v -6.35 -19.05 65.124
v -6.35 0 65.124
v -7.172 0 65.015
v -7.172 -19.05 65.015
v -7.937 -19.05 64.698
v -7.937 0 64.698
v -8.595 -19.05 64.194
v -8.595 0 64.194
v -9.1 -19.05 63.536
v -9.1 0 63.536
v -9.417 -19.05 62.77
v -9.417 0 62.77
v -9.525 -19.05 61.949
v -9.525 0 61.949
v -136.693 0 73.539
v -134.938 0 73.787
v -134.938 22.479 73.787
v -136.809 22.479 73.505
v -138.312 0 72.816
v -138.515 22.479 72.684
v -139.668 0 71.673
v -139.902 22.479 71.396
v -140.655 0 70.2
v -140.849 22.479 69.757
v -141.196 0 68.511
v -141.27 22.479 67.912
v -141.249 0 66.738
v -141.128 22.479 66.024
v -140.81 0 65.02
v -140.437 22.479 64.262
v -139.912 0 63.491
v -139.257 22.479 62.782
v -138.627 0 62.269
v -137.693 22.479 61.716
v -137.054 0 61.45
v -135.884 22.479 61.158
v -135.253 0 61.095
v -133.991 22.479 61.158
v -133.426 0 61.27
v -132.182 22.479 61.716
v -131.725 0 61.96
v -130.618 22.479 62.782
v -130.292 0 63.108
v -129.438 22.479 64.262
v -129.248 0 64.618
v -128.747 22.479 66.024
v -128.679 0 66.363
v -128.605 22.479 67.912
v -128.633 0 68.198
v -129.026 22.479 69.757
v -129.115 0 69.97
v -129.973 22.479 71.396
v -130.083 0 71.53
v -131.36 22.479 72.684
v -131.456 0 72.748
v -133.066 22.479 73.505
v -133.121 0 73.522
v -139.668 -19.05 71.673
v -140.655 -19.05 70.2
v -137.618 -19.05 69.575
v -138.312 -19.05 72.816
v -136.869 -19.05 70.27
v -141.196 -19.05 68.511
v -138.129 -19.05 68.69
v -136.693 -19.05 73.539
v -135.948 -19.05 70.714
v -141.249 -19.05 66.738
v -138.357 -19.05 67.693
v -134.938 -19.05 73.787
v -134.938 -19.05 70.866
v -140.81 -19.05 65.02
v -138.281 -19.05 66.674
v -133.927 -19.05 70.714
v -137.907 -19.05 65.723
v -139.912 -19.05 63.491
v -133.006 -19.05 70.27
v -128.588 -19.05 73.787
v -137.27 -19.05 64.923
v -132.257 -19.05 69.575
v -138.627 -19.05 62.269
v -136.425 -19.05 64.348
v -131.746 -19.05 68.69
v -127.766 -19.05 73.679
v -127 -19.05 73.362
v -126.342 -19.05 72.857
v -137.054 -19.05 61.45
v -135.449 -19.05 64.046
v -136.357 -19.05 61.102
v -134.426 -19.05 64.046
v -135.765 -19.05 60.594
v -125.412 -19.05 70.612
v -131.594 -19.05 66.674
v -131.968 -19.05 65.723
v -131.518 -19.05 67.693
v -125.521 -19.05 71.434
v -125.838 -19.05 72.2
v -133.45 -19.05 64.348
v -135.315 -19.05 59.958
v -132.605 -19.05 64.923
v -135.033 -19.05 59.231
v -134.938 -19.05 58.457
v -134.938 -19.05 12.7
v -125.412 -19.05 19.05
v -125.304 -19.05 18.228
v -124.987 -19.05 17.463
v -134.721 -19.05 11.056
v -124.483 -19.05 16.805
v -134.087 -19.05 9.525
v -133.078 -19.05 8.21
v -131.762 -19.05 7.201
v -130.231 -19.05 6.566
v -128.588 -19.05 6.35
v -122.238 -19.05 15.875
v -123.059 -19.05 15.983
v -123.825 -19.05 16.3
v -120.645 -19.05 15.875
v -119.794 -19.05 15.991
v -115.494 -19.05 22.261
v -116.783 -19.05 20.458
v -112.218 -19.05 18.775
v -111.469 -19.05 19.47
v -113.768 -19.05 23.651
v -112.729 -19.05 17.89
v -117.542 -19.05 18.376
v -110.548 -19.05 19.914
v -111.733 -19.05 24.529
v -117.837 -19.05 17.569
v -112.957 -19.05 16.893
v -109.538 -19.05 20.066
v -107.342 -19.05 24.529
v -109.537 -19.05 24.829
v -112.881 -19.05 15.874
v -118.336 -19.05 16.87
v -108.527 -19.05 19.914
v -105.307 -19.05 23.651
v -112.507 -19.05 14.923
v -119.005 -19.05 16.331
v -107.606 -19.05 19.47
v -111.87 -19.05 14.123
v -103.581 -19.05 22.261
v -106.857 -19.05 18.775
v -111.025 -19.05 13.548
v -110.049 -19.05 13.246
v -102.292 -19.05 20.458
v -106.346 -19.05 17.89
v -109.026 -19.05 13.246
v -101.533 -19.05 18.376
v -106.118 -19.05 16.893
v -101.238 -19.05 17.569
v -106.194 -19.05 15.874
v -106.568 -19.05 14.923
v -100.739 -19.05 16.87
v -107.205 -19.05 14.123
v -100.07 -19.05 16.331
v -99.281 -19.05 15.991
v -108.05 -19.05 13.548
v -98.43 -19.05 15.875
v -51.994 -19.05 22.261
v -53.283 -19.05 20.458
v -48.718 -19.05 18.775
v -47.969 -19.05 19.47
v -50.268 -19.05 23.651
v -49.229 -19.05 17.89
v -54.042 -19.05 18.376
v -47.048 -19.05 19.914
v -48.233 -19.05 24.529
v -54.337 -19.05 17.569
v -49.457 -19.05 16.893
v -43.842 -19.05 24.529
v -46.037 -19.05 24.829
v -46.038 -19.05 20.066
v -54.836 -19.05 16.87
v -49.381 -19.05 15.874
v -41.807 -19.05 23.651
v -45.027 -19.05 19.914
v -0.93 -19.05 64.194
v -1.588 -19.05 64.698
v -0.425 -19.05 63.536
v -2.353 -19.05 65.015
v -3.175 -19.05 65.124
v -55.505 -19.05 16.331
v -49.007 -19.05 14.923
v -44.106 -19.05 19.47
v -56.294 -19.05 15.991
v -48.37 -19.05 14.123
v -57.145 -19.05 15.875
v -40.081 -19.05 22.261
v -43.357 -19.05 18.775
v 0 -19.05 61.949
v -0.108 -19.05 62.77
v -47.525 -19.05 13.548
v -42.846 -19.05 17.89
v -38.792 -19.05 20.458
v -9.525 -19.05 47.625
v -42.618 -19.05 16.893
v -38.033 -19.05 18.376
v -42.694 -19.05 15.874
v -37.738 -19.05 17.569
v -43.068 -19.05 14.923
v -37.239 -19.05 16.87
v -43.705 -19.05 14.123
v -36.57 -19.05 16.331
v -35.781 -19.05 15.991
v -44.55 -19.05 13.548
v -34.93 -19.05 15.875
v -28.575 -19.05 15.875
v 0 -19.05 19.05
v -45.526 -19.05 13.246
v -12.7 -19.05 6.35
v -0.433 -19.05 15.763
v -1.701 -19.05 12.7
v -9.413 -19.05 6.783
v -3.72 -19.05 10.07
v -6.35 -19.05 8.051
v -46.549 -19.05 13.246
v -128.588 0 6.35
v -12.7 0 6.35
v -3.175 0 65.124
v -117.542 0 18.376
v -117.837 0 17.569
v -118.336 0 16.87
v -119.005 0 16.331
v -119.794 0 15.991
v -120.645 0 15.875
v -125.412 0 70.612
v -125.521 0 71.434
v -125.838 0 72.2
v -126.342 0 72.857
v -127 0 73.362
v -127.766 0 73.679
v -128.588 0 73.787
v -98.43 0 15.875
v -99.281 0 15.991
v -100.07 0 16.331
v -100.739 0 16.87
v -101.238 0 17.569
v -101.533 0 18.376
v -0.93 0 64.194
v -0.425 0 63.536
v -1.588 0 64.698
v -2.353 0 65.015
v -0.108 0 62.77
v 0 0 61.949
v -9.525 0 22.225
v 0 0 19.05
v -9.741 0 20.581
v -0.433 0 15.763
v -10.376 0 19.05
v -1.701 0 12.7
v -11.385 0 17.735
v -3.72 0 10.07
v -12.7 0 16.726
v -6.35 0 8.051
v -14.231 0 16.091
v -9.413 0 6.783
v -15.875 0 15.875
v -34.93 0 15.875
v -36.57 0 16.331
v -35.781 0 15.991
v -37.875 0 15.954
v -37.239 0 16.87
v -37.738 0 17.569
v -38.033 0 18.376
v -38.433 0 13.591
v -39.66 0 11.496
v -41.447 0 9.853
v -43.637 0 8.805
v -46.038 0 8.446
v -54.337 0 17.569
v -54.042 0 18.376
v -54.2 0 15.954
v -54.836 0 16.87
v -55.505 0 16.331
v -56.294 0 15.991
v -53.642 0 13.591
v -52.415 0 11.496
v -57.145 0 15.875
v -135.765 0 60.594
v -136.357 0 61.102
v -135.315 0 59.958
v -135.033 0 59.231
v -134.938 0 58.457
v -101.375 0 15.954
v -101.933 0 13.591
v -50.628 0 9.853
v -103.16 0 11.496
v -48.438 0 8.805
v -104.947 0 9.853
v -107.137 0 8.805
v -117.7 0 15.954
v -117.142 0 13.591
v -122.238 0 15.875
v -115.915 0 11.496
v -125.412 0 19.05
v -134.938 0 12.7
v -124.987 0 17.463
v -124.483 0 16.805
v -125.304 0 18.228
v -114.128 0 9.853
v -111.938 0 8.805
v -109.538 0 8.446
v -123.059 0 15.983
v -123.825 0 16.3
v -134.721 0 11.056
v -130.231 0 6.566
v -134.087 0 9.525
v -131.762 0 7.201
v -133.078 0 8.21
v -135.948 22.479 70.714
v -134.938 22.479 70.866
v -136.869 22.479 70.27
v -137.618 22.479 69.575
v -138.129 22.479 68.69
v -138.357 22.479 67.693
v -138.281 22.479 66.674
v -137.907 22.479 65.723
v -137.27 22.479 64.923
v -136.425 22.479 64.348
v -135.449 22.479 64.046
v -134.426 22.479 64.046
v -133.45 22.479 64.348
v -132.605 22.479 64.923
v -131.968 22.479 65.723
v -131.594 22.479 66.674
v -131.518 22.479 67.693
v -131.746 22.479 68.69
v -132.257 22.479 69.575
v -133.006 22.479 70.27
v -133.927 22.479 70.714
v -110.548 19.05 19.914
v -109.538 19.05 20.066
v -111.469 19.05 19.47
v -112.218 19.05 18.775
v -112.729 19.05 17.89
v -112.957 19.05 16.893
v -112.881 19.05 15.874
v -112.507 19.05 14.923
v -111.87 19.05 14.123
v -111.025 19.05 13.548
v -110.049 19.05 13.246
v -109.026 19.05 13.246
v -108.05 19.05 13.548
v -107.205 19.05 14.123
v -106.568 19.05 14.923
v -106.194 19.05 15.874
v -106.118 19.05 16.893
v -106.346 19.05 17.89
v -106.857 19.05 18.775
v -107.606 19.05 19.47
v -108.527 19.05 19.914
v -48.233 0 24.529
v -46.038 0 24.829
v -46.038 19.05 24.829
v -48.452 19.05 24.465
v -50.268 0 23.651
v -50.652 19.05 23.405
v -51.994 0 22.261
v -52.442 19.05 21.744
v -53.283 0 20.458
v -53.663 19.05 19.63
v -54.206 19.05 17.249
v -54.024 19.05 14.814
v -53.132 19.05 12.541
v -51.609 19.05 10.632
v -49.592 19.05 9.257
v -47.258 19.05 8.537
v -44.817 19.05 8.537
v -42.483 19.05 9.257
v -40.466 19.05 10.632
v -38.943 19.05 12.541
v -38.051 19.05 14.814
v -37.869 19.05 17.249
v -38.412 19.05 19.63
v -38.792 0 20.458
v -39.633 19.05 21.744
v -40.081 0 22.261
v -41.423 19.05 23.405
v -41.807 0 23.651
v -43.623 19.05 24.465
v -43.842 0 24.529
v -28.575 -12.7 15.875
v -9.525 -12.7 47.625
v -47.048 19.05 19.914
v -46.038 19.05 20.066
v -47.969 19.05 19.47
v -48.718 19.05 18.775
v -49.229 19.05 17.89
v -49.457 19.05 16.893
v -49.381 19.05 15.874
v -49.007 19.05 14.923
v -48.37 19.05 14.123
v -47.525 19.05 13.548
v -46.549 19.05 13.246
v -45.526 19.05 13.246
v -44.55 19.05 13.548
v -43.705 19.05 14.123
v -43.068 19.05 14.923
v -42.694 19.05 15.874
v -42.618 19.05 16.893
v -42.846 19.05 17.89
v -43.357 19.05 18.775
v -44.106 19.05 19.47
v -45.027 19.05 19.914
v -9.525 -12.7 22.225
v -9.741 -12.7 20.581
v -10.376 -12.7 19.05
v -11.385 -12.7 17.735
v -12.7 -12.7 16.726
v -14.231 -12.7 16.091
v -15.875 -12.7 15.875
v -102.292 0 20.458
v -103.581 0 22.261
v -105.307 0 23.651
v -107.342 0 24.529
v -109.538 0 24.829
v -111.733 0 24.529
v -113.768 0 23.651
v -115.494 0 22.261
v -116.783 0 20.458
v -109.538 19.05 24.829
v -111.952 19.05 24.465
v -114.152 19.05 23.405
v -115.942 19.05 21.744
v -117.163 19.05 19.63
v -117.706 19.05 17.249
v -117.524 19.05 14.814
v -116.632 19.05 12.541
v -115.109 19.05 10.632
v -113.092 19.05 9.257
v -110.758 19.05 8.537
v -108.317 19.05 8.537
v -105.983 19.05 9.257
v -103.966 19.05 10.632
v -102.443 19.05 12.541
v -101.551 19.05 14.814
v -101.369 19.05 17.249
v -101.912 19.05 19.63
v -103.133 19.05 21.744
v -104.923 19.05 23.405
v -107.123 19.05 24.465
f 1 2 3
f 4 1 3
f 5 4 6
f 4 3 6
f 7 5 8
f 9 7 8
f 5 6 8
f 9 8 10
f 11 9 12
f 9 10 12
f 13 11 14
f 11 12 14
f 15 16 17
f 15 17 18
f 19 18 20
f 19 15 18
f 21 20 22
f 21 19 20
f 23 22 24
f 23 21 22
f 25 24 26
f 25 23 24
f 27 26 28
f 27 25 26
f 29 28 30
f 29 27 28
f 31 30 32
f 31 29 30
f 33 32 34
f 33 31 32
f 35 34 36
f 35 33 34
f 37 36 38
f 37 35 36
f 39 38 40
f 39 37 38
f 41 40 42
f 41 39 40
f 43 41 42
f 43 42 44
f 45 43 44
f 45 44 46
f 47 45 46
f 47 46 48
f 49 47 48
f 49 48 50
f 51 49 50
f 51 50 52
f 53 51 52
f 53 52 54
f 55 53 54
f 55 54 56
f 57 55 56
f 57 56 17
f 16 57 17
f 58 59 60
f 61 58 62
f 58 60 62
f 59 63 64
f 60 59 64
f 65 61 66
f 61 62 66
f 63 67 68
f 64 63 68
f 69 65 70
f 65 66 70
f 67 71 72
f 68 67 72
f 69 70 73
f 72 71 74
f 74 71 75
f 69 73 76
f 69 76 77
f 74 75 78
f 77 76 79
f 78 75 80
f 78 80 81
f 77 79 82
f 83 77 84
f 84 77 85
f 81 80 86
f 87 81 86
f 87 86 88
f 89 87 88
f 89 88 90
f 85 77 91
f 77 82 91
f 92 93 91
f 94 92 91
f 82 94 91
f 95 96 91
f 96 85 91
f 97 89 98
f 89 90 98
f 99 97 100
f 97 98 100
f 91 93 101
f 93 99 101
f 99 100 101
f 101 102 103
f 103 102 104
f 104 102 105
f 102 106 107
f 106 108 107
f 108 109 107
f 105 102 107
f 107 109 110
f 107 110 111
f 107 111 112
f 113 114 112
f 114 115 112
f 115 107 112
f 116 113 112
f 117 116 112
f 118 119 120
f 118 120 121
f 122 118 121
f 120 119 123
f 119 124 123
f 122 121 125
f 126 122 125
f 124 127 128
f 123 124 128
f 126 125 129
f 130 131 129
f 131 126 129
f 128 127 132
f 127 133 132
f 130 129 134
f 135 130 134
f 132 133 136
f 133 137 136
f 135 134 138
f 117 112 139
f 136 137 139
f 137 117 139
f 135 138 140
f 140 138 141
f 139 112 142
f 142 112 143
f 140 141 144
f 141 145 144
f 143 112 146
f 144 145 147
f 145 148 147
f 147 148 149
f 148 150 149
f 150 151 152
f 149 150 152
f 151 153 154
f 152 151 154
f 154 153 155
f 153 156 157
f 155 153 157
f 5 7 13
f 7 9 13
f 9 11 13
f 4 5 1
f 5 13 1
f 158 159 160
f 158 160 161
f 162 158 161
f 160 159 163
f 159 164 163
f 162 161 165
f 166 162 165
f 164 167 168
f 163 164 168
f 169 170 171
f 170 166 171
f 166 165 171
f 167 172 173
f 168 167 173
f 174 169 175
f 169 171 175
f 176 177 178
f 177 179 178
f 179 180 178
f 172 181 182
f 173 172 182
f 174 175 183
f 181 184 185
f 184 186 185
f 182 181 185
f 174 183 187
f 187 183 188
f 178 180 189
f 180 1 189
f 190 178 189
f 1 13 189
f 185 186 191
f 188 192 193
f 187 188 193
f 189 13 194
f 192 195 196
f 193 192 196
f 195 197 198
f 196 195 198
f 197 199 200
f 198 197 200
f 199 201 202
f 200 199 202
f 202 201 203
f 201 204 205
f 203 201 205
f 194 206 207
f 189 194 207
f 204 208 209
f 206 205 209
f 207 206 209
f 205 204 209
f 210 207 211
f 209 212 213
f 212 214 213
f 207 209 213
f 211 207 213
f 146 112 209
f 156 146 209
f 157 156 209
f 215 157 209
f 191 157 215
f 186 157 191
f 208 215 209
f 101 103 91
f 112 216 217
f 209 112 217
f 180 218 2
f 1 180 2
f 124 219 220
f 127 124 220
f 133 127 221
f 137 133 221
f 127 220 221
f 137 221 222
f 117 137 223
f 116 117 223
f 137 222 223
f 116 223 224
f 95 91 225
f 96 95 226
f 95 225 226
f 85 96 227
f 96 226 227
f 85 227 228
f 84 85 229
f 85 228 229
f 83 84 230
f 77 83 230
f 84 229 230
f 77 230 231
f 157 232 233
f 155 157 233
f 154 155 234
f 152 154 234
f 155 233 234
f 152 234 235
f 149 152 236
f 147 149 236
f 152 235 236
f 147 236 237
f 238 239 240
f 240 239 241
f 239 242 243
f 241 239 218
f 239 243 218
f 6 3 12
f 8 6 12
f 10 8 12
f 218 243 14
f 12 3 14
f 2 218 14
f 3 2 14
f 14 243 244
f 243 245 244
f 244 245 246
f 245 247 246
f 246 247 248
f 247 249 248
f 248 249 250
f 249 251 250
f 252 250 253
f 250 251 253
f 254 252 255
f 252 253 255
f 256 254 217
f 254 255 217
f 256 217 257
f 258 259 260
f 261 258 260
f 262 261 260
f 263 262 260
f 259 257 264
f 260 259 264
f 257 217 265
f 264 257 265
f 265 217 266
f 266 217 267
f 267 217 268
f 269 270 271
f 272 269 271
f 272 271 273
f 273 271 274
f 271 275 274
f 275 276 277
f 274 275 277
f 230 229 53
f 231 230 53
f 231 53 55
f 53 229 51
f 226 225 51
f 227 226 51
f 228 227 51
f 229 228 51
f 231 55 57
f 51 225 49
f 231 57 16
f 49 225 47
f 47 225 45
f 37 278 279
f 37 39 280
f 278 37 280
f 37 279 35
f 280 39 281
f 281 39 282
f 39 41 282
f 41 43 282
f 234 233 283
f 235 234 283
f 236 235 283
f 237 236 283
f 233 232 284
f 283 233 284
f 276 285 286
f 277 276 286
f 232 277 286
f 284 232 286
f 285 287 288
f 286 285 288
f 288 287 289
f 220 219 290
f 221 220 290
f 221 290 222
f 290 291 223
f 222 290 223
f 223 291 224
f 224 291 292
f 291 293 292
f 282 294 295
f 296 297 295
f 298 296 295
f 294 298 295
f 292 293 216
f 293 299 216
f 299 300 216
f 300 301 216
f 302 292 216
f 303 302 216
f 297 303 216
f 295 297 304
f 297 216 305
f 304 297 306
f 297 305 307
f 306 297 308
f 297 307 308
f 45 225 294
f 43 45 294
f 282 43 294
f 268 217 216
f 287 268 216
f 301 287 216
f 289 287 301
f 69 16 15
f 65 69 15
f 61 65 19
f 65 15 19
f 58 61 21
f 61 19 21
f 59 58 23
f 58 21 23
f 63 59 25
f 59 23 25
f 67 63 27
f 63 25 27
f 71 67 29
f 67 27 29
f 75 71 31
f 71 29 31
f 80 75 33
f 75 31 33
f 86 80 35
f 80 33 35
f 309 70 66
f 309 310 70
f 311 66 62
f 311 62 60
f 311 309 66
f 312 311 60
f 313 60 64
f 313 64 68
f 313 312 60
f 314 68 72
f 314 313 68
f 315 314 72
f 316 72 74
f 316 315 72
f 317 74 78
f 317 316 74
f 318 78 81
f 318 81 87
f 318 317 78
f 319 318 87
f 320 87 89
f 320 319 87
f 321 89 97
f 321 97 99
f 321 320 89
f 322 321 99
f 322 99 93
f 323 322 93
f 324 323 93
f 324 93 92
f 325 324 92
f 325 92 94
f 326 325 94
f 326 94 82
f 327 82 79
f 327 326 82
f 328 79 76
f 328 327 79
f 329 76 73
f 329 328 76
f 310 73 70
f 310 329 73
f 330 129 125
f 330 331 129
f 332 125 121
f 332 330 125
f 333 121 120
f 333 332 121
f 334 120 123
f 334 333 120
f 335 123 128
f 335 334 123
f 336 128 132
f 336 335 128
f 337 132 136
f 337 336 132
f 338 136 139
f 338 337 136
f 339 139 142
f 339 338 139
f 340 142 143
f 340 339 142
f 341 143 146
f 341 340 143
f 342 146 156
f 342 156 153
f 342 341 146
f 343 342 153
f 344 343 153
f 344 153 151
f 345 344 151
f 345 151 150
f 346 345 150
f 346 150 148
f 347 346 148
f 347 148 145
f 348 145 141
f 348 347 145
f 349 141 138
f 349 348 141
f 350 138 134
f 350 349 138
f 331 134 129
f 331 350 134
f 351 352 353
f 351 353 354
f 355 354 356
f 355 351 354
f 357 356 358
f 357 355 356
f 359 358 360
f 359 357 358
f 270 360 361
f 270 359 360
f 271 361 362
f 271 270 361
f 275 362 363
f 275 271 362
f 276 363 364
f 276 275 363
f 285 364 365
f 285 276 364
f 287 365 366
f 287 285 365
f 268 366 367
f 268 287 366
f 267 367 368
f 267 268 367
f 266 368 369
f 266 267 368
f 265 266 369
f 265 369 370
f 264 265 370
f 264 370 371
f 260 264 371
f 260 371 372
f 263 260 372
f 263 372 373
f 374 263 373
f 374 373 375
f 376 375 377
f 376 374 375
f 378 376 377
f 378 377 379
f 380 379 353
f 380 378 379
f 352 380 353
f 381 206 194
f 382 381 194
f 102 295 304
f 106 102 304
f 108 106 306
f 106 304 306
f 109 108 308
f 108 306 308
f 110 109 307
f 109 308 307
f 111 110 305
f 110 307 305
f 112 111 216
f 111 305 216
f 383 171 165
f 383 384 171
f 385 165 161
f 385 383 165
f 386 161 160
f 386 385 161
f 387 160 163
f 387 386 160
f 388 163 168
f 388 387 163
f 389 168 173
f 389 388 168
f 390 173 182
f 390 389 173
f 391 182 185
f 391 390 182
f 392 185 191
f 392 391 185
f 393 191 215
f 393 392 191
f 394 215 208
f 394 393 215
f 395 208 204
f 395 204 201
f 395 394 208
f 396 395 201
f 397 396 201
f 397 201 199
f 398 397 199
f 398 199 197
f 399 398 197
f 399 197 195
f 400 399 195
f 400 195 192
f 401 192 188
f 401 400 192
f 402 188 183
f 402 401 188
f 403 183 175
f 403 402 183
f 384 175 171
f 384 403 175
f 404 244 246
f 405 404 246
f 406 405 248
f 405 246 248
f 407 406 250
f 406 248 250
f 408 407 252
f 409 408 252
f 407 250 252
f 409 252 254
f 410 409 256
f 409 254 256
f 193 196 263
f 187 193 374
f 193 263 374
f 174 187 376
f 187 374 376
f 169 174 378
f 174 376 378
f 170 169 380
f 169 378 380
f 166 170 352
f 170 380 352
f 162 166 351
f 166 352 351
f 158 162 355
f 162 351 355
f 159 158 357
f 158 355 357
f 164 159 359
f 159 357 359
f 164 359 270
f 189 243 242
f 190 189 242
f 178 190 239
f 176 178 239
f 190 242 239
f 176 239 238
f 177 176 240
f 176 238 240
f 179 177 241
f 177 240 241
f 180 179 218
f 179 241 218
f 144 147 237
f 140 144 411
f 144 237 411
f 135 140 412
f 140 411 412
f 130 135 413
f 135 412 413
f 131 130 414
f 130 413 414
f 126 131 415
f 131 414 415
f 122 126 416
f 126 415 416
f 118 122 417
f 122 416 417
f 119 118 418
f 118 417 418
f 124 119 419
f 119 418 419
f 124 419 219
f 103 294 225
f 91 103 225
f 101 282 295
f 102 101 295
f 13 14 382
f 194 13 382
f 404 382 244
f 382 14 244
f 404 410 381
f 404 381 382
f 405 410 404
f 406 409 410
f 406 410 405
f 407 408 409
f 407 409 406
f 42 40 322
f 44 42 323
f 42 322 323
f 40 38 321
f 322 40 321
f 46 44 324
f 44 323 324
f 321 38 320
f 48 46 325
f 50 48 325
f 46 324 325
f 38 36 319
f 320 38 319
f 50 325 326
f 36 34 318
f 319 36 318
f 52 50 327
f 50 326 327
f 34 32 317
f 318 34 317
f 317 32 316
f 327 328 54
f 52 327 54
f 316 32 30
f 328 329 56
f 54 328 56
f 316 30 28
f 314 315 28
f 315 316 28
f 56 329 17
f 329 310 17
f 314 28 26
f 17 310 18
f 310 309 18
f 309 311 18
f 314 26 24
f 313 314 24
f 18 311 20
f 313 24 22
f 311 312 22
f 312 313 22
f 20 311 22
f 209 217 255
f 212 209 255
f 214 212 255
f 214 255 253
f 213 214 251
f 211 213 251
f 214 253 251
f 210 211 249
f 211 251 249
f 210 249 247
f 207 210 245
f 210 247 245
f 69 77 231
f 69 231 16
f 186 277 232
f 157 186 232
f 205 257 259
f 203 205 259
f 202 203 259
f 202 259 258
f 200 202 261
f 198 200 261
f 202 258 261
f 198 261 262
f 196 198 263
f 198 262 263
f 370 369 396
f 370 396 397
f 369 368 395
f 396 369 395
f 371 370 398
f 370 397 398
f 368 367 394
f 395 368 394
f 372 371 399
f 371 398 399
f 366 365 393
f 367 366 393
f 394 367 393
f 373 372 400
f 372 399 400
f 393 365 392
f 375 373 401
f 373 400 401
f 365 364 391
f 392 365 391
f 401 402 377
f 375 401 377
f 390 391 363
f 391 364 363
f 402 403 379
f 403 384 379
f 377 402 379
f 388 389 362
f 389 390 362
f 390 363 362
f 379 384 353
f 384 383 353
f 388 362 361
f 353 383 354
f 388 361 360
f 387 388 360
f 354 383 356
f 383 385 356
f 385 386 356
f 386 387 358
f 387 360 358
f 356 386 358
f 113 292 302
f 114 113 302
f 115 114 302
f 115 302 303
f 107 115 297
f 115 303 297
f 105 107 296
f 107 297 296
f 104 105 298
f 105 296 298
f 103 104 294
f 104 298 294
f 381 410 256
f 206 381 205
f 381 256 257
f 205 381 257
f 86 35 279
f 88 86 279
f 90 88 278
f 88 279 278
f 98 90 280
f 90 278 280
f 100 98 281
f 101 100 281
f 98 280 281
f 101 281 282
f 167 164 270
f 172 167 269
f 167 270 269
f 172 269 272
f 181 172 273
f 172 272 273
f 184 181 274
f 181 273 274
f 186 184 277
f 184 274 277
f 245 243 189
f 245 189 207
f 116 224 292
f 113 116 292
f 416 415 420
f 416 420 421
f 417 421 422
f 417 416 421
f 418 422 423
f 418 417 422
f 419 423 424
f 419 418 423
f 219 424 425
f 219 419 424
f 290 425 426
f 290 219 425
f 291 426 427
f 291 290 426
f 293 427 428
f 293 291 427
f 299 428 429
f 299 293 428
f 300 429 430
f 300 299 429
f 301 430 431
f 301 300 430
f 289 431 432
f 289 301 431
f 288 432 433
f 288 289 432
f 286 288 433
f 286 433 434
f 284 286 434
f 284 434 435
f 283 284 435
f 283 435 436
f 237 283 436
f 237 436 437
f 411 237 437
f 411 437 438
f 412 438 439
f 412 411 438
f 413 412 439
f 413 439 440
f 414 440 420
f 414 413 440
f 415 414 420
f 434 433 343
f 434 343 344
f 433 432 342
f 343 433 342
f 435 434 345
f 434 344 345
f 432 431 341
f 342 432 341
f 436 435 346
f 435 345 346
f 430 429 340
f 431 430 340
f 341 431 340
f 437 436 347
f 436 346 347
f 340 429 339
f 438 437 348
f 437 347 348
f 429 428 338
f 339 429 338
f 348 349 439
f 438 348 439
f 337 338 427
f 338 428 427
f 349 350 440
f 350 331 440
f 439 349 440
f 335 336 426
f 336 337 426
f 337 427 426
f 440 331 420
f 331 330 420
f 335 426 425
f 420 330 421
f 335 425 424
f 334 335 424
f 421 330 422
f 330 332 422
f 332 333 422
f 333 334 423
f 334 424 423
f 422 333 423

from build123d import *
from build123d.topology import SkipClean

# Parameters (mm, degrees)
SKETCH2_R                      = 3.429
BOSS_EXTRUDE1_DEPTH            = 19.05
SKETCH3_R                      = 8.1915
SKETCH3_R_2                    = 3.429
SKETCH3_R_3                    = 6.35
BOSS_EXTRUDE2_DEPTH            = 19.05
SKETCH4_R                      = 6.35
SKETCH4_R_2                    = 3.429
BOSS_EXTRUDE5_DEPTH            = 3.429
BOSS_EXTRUDE6_START            = -19.05
BOSS_EXTRUDE6_DEPTH            = 6.35
CUT_EXTRUDE2_REACH             = 162.972
SKETCH7_W                      = 141.2875
SKETCH7_H                      = 67.437060646
CUT_EXTRUDE2_DIRECTION_2_REACH = 162.972


with BuildPart() as part:
    # Sketch2 → Boss-Extrude1 (new body)
    with BuildSketch(Plane(origin=(0, 0, 0), x_dir=(1, 0, 0), z_dir=(0, 1, 0))):
        with BuildLine():
            Line((57.144932013, -15.875), (98.430067987, -15.875))
            ThreePointArc((98.430067987, -15.875), (100.422636409, -16.578098691), (101.532702627, -18.375994594))
            ThreePointArc((101.532702627, -18.375994594), (109.5375, -24.828560646), (117.542297372, -18.375994594))
            ThreePointArc((117.542297372, -18.375994594), (118.652363591, -16.578098691), (120.644932013, -15.875))
            Line((120.644932013, -15.875), (122.2375, -15.875))
            ThreePointArc((122.2375, -15.875), (124.48256403, -16.80493597), (125.4125, -19.05))
            Line((125.4125, -19.05), (125.4125, -70.612060646))
            ThreePointArc((125.4125, -70.612060646), (126.34243597, -72.857124676), (128.5875, -73.787060646))
            Line((128.5875, -73.787060646), (134.9375, -73.787060646))
            ThreePointArc((134.9375, -73.787060646), (141.196050854, -68.510858211), (137.054166667, -61.450223232))
            ThreePointArc((137.054166667, -61.450223232), (135.520123355, -60.28989163), (134.9375, -58.456804525))
            Line((134.9375, -58.456804525), (134.9375, -12.7))
            ThreePointArc((134.9375, -12.7), (133.07762806, -8.209871939), (128.5875, -6.35))
            Line((128.5875, -6.35), (12.7, -6.35))
            ThreePointArc((12.7, -6.35), (3.719743879, -10.069743879), (0, -19.05))
            Line((0, -19.05), (0, -61.948583794))
            ThreePointArc((0, -61.948583794), (0.92993597, -64.193647824), (3.175, -65.123583794))
            Line((3.175, -65.123583794), (6.35, -65.123583794))
            ThreePointArc((6.35, -65.123583794), (8.59506403, -64.193647824), (9.525, -61.948583794))
            Line((9.525, -61.948583794), (9.525, -22.225))
            ThreePointArc((9.525, -22.225), (11.384871939, -17.734871939), (15.875, -15.875))
            Line((15.875, -15.875), (34.930067987, -15.875))
            ThreePointArc((34.930067987, -15.875), (36.922636409, -16.578098691), (38.032702627, -18.375994594))
            ThreePointArc((38.032702627, -18.375994594), (46.0375, -24.828560646), (54.042297372, -18.375994594))
            ThreePointArc((54.042297372, -18.375994594), (55.152363591, -16.578098691), (57.144932013, -15.875))
        make_face()
        with Locations(Location((46.0375, -16.637060646, 0), (0, 0, 270))):
            Circle(SKETCH2_R, mode=Mode.SUBTRACT)
        with Locations(Location((109.5375, -16.637060646, 0), (0, 0, 270))):
            Circle(SKETCH2_R, mode=Mode.SUBTRACT)
        with Locations(Location((134.9375, -67.437060646, 0), (0, 0, 270))):
            Circle(SKETCH2_R, mode=Mode.SUBTRACT)
    boss_extrude1 = extrude(amount=-BOSS_EXTRUDE1_DEPTH)

    # Sketch3 → Boss-Extrude2 (add)
    with BuildSketch(Plane(origin=(0, 0, 0), x_dir=(1, 0, 0), z_dir=(0, 1, 0))):
        with Locations(Location((46.0375, -16.637060646, 0), (0, 0, 270))):
            Circle(SKETCH3_R)
        with Locations(Location((46.0375, -16.637060646, 0), (0, 0, 270))):
            Circle(SKETCH3_R_2, mode=Mode.SUBTRACT)
        with Locations(Location((109.5375, -16.637060646, 0), (0, 0, 270))):
            Circle(SKETCH3_R)
        with Locations(Location((109.5375, -16.637060646, 0), (0, 0, 270))):
            Circle(SKETCH3_R_2, mode=Mode.SUBTRACT)
        with Locations(Location((134.9375, -67.437060646, 0), (0, 0, 270))):
            Circle(SKETCH3_R_3)
        with Locations(Location((134.9375, -67.437060646, 0), (0, 0, 270))):
            Circle(SKETCH3_R_2, mode=Mode.SUBTRACT)
    boss_extrude2 = extrude(amount=BOSS_EXTRUDE2_DEPTH)

    # Sketch4 → Boss-Extrude5 (add)
    with BuildSketch(Plane(origin=(0, 19.05, 0), x_dir=(1, 0, 0), z_dir=(0, 1, 0))):
        with Locations(Location((134.9375, -67.437060646, 0), (0, 0, 270))):
            Circle(SKETCH4_R)
        with Locations(Location((134.9375, -67.437060646, 0), (0, 0, 270))):
            Circle(SKETCH4_R_2, mode=Mode.SUBTRACT)
    boss_extrude5 = extrude(amount=BOSS_EXTRUDE5_DEPTH)

    # Sketch6 → Boss-Extrude6 (add)
    with BuildSketch(Plane(origin=(0, 0, 0), x_dir=(1, 0, 0), z_dir=(0, 1, 0)).offset(BOSS_EXTRUDE6_START)):
        Polygon((28.575, -15.875), (9.525, -47.625), (9.525, -15.875), align=None)
    boss_extrude6 = extrude(amount=BOSS_EXTRUDE6_DEPTH)

    # Mirror4: Boss-Extrude1, Boss-Extrude2, Boss-Extrude5, Boss-Extrude6 across plane
    with SkipClean():  # the faces are left unmerged after this step: merging them gives an invalid solid
        add(boss_extrude1.mirror(Plane(origin=(0, -19.05, 19.05), x_dir=(0, 0, 1), z_dir=(-1, 0, 0))))
        add(boss_extrude2.mirror(Plane(origin=(0, -19.05, 19.05), x_dir=(0, 0, 1), z_dir=(-1, 0, 0))))
        add(boss_extrude5.mirror(Plane(origin=(0, -19.05, 19.05), x_dir=(0, 0, 1), z_dir=(-1, 0, 0))))
        add(boss_extrude6.mirror(Plane(origin=(0, -19.05, 19.05), x_dir=(0, 0, 1), z_dir=(-1, 0, 0))))

    # Cut-Extrude2: up to this face of the body (flat: up to its plane)
    cut_extrude2_end = Plane(part.part.faces().sort_by_distance((134.9375, 22.479, 61.266665768))[0])
    # Sketch7 → Cut-Extrude2 (cut, up to the picked face)
    with BuildSketch(Plane(origin=(0, 0, 0), x_dir=(1, 0, 0), z_dir=(0, 1, 0)), mode=Mode.PRIVATE) as cut_extrude2_sk1:
        with Locations((70.64375, -40.068530323)):
            Rectangle(SKETCH7_W, SKETCH7_H)
    cut_extrude2_tool1 = split(extrude(cut_extrude2_sk1.sketch, amount=CUT_EXTRUDE2_REACH, mode=Mode.PRIVATE), bisect_by=cut_extrude2_end, keep=Keep.BOTH, mode=Mode.PRIVATE)
    add(cut_extrude2_tool1.solids().sort_by(Axis((70.64375, 0, 40.06853), (0, 1, 0)))[0], mode=Mode.SUBTRACT)

    # Cut-Extrude2 direction 2: up to this face of the body (flat: up to its plane)
    cut_extrude2_direction_2_end = Plane(part.part.faces().sort_by_distance((0.921292425, -19.05, 25.561080077))[0])
    # Sketch7 → Cut-Extrude2 direction 2 (cut, up to the picked face)
    with BuildSketch(Plane(origin=(0, 0, 0), x_dir=(1, 0, 0), z_dir=(0, 1, 0)), mode=Mode.PRIVATE) as cut_extrude2_direction_2_sk1:
        with Locations((70.64375, -40.068530323)):
            Rectangle(SKETCH7_W, SKETCH7_H)
    cut_extrude2_direction_2_tool1 = split(extrude(cut_extrude2_direction_2_sk1.sketch, amount=-CUT_EXTRUDE2_DIRECTION_2_REACH, mode=Mode.PRIVATE), bisect_by=cut_extrude2_direction_2_end, keep=Keep.BOTH, mode=Mode.PRIVATE)
    add(cut_extrude2_direction_2_tool1.solids().sort_by(Axis((70.64375, 0, 40.06853), (0, -1, 0)))[0], mode=Mode.SUBTRACT)


solid = part.part
